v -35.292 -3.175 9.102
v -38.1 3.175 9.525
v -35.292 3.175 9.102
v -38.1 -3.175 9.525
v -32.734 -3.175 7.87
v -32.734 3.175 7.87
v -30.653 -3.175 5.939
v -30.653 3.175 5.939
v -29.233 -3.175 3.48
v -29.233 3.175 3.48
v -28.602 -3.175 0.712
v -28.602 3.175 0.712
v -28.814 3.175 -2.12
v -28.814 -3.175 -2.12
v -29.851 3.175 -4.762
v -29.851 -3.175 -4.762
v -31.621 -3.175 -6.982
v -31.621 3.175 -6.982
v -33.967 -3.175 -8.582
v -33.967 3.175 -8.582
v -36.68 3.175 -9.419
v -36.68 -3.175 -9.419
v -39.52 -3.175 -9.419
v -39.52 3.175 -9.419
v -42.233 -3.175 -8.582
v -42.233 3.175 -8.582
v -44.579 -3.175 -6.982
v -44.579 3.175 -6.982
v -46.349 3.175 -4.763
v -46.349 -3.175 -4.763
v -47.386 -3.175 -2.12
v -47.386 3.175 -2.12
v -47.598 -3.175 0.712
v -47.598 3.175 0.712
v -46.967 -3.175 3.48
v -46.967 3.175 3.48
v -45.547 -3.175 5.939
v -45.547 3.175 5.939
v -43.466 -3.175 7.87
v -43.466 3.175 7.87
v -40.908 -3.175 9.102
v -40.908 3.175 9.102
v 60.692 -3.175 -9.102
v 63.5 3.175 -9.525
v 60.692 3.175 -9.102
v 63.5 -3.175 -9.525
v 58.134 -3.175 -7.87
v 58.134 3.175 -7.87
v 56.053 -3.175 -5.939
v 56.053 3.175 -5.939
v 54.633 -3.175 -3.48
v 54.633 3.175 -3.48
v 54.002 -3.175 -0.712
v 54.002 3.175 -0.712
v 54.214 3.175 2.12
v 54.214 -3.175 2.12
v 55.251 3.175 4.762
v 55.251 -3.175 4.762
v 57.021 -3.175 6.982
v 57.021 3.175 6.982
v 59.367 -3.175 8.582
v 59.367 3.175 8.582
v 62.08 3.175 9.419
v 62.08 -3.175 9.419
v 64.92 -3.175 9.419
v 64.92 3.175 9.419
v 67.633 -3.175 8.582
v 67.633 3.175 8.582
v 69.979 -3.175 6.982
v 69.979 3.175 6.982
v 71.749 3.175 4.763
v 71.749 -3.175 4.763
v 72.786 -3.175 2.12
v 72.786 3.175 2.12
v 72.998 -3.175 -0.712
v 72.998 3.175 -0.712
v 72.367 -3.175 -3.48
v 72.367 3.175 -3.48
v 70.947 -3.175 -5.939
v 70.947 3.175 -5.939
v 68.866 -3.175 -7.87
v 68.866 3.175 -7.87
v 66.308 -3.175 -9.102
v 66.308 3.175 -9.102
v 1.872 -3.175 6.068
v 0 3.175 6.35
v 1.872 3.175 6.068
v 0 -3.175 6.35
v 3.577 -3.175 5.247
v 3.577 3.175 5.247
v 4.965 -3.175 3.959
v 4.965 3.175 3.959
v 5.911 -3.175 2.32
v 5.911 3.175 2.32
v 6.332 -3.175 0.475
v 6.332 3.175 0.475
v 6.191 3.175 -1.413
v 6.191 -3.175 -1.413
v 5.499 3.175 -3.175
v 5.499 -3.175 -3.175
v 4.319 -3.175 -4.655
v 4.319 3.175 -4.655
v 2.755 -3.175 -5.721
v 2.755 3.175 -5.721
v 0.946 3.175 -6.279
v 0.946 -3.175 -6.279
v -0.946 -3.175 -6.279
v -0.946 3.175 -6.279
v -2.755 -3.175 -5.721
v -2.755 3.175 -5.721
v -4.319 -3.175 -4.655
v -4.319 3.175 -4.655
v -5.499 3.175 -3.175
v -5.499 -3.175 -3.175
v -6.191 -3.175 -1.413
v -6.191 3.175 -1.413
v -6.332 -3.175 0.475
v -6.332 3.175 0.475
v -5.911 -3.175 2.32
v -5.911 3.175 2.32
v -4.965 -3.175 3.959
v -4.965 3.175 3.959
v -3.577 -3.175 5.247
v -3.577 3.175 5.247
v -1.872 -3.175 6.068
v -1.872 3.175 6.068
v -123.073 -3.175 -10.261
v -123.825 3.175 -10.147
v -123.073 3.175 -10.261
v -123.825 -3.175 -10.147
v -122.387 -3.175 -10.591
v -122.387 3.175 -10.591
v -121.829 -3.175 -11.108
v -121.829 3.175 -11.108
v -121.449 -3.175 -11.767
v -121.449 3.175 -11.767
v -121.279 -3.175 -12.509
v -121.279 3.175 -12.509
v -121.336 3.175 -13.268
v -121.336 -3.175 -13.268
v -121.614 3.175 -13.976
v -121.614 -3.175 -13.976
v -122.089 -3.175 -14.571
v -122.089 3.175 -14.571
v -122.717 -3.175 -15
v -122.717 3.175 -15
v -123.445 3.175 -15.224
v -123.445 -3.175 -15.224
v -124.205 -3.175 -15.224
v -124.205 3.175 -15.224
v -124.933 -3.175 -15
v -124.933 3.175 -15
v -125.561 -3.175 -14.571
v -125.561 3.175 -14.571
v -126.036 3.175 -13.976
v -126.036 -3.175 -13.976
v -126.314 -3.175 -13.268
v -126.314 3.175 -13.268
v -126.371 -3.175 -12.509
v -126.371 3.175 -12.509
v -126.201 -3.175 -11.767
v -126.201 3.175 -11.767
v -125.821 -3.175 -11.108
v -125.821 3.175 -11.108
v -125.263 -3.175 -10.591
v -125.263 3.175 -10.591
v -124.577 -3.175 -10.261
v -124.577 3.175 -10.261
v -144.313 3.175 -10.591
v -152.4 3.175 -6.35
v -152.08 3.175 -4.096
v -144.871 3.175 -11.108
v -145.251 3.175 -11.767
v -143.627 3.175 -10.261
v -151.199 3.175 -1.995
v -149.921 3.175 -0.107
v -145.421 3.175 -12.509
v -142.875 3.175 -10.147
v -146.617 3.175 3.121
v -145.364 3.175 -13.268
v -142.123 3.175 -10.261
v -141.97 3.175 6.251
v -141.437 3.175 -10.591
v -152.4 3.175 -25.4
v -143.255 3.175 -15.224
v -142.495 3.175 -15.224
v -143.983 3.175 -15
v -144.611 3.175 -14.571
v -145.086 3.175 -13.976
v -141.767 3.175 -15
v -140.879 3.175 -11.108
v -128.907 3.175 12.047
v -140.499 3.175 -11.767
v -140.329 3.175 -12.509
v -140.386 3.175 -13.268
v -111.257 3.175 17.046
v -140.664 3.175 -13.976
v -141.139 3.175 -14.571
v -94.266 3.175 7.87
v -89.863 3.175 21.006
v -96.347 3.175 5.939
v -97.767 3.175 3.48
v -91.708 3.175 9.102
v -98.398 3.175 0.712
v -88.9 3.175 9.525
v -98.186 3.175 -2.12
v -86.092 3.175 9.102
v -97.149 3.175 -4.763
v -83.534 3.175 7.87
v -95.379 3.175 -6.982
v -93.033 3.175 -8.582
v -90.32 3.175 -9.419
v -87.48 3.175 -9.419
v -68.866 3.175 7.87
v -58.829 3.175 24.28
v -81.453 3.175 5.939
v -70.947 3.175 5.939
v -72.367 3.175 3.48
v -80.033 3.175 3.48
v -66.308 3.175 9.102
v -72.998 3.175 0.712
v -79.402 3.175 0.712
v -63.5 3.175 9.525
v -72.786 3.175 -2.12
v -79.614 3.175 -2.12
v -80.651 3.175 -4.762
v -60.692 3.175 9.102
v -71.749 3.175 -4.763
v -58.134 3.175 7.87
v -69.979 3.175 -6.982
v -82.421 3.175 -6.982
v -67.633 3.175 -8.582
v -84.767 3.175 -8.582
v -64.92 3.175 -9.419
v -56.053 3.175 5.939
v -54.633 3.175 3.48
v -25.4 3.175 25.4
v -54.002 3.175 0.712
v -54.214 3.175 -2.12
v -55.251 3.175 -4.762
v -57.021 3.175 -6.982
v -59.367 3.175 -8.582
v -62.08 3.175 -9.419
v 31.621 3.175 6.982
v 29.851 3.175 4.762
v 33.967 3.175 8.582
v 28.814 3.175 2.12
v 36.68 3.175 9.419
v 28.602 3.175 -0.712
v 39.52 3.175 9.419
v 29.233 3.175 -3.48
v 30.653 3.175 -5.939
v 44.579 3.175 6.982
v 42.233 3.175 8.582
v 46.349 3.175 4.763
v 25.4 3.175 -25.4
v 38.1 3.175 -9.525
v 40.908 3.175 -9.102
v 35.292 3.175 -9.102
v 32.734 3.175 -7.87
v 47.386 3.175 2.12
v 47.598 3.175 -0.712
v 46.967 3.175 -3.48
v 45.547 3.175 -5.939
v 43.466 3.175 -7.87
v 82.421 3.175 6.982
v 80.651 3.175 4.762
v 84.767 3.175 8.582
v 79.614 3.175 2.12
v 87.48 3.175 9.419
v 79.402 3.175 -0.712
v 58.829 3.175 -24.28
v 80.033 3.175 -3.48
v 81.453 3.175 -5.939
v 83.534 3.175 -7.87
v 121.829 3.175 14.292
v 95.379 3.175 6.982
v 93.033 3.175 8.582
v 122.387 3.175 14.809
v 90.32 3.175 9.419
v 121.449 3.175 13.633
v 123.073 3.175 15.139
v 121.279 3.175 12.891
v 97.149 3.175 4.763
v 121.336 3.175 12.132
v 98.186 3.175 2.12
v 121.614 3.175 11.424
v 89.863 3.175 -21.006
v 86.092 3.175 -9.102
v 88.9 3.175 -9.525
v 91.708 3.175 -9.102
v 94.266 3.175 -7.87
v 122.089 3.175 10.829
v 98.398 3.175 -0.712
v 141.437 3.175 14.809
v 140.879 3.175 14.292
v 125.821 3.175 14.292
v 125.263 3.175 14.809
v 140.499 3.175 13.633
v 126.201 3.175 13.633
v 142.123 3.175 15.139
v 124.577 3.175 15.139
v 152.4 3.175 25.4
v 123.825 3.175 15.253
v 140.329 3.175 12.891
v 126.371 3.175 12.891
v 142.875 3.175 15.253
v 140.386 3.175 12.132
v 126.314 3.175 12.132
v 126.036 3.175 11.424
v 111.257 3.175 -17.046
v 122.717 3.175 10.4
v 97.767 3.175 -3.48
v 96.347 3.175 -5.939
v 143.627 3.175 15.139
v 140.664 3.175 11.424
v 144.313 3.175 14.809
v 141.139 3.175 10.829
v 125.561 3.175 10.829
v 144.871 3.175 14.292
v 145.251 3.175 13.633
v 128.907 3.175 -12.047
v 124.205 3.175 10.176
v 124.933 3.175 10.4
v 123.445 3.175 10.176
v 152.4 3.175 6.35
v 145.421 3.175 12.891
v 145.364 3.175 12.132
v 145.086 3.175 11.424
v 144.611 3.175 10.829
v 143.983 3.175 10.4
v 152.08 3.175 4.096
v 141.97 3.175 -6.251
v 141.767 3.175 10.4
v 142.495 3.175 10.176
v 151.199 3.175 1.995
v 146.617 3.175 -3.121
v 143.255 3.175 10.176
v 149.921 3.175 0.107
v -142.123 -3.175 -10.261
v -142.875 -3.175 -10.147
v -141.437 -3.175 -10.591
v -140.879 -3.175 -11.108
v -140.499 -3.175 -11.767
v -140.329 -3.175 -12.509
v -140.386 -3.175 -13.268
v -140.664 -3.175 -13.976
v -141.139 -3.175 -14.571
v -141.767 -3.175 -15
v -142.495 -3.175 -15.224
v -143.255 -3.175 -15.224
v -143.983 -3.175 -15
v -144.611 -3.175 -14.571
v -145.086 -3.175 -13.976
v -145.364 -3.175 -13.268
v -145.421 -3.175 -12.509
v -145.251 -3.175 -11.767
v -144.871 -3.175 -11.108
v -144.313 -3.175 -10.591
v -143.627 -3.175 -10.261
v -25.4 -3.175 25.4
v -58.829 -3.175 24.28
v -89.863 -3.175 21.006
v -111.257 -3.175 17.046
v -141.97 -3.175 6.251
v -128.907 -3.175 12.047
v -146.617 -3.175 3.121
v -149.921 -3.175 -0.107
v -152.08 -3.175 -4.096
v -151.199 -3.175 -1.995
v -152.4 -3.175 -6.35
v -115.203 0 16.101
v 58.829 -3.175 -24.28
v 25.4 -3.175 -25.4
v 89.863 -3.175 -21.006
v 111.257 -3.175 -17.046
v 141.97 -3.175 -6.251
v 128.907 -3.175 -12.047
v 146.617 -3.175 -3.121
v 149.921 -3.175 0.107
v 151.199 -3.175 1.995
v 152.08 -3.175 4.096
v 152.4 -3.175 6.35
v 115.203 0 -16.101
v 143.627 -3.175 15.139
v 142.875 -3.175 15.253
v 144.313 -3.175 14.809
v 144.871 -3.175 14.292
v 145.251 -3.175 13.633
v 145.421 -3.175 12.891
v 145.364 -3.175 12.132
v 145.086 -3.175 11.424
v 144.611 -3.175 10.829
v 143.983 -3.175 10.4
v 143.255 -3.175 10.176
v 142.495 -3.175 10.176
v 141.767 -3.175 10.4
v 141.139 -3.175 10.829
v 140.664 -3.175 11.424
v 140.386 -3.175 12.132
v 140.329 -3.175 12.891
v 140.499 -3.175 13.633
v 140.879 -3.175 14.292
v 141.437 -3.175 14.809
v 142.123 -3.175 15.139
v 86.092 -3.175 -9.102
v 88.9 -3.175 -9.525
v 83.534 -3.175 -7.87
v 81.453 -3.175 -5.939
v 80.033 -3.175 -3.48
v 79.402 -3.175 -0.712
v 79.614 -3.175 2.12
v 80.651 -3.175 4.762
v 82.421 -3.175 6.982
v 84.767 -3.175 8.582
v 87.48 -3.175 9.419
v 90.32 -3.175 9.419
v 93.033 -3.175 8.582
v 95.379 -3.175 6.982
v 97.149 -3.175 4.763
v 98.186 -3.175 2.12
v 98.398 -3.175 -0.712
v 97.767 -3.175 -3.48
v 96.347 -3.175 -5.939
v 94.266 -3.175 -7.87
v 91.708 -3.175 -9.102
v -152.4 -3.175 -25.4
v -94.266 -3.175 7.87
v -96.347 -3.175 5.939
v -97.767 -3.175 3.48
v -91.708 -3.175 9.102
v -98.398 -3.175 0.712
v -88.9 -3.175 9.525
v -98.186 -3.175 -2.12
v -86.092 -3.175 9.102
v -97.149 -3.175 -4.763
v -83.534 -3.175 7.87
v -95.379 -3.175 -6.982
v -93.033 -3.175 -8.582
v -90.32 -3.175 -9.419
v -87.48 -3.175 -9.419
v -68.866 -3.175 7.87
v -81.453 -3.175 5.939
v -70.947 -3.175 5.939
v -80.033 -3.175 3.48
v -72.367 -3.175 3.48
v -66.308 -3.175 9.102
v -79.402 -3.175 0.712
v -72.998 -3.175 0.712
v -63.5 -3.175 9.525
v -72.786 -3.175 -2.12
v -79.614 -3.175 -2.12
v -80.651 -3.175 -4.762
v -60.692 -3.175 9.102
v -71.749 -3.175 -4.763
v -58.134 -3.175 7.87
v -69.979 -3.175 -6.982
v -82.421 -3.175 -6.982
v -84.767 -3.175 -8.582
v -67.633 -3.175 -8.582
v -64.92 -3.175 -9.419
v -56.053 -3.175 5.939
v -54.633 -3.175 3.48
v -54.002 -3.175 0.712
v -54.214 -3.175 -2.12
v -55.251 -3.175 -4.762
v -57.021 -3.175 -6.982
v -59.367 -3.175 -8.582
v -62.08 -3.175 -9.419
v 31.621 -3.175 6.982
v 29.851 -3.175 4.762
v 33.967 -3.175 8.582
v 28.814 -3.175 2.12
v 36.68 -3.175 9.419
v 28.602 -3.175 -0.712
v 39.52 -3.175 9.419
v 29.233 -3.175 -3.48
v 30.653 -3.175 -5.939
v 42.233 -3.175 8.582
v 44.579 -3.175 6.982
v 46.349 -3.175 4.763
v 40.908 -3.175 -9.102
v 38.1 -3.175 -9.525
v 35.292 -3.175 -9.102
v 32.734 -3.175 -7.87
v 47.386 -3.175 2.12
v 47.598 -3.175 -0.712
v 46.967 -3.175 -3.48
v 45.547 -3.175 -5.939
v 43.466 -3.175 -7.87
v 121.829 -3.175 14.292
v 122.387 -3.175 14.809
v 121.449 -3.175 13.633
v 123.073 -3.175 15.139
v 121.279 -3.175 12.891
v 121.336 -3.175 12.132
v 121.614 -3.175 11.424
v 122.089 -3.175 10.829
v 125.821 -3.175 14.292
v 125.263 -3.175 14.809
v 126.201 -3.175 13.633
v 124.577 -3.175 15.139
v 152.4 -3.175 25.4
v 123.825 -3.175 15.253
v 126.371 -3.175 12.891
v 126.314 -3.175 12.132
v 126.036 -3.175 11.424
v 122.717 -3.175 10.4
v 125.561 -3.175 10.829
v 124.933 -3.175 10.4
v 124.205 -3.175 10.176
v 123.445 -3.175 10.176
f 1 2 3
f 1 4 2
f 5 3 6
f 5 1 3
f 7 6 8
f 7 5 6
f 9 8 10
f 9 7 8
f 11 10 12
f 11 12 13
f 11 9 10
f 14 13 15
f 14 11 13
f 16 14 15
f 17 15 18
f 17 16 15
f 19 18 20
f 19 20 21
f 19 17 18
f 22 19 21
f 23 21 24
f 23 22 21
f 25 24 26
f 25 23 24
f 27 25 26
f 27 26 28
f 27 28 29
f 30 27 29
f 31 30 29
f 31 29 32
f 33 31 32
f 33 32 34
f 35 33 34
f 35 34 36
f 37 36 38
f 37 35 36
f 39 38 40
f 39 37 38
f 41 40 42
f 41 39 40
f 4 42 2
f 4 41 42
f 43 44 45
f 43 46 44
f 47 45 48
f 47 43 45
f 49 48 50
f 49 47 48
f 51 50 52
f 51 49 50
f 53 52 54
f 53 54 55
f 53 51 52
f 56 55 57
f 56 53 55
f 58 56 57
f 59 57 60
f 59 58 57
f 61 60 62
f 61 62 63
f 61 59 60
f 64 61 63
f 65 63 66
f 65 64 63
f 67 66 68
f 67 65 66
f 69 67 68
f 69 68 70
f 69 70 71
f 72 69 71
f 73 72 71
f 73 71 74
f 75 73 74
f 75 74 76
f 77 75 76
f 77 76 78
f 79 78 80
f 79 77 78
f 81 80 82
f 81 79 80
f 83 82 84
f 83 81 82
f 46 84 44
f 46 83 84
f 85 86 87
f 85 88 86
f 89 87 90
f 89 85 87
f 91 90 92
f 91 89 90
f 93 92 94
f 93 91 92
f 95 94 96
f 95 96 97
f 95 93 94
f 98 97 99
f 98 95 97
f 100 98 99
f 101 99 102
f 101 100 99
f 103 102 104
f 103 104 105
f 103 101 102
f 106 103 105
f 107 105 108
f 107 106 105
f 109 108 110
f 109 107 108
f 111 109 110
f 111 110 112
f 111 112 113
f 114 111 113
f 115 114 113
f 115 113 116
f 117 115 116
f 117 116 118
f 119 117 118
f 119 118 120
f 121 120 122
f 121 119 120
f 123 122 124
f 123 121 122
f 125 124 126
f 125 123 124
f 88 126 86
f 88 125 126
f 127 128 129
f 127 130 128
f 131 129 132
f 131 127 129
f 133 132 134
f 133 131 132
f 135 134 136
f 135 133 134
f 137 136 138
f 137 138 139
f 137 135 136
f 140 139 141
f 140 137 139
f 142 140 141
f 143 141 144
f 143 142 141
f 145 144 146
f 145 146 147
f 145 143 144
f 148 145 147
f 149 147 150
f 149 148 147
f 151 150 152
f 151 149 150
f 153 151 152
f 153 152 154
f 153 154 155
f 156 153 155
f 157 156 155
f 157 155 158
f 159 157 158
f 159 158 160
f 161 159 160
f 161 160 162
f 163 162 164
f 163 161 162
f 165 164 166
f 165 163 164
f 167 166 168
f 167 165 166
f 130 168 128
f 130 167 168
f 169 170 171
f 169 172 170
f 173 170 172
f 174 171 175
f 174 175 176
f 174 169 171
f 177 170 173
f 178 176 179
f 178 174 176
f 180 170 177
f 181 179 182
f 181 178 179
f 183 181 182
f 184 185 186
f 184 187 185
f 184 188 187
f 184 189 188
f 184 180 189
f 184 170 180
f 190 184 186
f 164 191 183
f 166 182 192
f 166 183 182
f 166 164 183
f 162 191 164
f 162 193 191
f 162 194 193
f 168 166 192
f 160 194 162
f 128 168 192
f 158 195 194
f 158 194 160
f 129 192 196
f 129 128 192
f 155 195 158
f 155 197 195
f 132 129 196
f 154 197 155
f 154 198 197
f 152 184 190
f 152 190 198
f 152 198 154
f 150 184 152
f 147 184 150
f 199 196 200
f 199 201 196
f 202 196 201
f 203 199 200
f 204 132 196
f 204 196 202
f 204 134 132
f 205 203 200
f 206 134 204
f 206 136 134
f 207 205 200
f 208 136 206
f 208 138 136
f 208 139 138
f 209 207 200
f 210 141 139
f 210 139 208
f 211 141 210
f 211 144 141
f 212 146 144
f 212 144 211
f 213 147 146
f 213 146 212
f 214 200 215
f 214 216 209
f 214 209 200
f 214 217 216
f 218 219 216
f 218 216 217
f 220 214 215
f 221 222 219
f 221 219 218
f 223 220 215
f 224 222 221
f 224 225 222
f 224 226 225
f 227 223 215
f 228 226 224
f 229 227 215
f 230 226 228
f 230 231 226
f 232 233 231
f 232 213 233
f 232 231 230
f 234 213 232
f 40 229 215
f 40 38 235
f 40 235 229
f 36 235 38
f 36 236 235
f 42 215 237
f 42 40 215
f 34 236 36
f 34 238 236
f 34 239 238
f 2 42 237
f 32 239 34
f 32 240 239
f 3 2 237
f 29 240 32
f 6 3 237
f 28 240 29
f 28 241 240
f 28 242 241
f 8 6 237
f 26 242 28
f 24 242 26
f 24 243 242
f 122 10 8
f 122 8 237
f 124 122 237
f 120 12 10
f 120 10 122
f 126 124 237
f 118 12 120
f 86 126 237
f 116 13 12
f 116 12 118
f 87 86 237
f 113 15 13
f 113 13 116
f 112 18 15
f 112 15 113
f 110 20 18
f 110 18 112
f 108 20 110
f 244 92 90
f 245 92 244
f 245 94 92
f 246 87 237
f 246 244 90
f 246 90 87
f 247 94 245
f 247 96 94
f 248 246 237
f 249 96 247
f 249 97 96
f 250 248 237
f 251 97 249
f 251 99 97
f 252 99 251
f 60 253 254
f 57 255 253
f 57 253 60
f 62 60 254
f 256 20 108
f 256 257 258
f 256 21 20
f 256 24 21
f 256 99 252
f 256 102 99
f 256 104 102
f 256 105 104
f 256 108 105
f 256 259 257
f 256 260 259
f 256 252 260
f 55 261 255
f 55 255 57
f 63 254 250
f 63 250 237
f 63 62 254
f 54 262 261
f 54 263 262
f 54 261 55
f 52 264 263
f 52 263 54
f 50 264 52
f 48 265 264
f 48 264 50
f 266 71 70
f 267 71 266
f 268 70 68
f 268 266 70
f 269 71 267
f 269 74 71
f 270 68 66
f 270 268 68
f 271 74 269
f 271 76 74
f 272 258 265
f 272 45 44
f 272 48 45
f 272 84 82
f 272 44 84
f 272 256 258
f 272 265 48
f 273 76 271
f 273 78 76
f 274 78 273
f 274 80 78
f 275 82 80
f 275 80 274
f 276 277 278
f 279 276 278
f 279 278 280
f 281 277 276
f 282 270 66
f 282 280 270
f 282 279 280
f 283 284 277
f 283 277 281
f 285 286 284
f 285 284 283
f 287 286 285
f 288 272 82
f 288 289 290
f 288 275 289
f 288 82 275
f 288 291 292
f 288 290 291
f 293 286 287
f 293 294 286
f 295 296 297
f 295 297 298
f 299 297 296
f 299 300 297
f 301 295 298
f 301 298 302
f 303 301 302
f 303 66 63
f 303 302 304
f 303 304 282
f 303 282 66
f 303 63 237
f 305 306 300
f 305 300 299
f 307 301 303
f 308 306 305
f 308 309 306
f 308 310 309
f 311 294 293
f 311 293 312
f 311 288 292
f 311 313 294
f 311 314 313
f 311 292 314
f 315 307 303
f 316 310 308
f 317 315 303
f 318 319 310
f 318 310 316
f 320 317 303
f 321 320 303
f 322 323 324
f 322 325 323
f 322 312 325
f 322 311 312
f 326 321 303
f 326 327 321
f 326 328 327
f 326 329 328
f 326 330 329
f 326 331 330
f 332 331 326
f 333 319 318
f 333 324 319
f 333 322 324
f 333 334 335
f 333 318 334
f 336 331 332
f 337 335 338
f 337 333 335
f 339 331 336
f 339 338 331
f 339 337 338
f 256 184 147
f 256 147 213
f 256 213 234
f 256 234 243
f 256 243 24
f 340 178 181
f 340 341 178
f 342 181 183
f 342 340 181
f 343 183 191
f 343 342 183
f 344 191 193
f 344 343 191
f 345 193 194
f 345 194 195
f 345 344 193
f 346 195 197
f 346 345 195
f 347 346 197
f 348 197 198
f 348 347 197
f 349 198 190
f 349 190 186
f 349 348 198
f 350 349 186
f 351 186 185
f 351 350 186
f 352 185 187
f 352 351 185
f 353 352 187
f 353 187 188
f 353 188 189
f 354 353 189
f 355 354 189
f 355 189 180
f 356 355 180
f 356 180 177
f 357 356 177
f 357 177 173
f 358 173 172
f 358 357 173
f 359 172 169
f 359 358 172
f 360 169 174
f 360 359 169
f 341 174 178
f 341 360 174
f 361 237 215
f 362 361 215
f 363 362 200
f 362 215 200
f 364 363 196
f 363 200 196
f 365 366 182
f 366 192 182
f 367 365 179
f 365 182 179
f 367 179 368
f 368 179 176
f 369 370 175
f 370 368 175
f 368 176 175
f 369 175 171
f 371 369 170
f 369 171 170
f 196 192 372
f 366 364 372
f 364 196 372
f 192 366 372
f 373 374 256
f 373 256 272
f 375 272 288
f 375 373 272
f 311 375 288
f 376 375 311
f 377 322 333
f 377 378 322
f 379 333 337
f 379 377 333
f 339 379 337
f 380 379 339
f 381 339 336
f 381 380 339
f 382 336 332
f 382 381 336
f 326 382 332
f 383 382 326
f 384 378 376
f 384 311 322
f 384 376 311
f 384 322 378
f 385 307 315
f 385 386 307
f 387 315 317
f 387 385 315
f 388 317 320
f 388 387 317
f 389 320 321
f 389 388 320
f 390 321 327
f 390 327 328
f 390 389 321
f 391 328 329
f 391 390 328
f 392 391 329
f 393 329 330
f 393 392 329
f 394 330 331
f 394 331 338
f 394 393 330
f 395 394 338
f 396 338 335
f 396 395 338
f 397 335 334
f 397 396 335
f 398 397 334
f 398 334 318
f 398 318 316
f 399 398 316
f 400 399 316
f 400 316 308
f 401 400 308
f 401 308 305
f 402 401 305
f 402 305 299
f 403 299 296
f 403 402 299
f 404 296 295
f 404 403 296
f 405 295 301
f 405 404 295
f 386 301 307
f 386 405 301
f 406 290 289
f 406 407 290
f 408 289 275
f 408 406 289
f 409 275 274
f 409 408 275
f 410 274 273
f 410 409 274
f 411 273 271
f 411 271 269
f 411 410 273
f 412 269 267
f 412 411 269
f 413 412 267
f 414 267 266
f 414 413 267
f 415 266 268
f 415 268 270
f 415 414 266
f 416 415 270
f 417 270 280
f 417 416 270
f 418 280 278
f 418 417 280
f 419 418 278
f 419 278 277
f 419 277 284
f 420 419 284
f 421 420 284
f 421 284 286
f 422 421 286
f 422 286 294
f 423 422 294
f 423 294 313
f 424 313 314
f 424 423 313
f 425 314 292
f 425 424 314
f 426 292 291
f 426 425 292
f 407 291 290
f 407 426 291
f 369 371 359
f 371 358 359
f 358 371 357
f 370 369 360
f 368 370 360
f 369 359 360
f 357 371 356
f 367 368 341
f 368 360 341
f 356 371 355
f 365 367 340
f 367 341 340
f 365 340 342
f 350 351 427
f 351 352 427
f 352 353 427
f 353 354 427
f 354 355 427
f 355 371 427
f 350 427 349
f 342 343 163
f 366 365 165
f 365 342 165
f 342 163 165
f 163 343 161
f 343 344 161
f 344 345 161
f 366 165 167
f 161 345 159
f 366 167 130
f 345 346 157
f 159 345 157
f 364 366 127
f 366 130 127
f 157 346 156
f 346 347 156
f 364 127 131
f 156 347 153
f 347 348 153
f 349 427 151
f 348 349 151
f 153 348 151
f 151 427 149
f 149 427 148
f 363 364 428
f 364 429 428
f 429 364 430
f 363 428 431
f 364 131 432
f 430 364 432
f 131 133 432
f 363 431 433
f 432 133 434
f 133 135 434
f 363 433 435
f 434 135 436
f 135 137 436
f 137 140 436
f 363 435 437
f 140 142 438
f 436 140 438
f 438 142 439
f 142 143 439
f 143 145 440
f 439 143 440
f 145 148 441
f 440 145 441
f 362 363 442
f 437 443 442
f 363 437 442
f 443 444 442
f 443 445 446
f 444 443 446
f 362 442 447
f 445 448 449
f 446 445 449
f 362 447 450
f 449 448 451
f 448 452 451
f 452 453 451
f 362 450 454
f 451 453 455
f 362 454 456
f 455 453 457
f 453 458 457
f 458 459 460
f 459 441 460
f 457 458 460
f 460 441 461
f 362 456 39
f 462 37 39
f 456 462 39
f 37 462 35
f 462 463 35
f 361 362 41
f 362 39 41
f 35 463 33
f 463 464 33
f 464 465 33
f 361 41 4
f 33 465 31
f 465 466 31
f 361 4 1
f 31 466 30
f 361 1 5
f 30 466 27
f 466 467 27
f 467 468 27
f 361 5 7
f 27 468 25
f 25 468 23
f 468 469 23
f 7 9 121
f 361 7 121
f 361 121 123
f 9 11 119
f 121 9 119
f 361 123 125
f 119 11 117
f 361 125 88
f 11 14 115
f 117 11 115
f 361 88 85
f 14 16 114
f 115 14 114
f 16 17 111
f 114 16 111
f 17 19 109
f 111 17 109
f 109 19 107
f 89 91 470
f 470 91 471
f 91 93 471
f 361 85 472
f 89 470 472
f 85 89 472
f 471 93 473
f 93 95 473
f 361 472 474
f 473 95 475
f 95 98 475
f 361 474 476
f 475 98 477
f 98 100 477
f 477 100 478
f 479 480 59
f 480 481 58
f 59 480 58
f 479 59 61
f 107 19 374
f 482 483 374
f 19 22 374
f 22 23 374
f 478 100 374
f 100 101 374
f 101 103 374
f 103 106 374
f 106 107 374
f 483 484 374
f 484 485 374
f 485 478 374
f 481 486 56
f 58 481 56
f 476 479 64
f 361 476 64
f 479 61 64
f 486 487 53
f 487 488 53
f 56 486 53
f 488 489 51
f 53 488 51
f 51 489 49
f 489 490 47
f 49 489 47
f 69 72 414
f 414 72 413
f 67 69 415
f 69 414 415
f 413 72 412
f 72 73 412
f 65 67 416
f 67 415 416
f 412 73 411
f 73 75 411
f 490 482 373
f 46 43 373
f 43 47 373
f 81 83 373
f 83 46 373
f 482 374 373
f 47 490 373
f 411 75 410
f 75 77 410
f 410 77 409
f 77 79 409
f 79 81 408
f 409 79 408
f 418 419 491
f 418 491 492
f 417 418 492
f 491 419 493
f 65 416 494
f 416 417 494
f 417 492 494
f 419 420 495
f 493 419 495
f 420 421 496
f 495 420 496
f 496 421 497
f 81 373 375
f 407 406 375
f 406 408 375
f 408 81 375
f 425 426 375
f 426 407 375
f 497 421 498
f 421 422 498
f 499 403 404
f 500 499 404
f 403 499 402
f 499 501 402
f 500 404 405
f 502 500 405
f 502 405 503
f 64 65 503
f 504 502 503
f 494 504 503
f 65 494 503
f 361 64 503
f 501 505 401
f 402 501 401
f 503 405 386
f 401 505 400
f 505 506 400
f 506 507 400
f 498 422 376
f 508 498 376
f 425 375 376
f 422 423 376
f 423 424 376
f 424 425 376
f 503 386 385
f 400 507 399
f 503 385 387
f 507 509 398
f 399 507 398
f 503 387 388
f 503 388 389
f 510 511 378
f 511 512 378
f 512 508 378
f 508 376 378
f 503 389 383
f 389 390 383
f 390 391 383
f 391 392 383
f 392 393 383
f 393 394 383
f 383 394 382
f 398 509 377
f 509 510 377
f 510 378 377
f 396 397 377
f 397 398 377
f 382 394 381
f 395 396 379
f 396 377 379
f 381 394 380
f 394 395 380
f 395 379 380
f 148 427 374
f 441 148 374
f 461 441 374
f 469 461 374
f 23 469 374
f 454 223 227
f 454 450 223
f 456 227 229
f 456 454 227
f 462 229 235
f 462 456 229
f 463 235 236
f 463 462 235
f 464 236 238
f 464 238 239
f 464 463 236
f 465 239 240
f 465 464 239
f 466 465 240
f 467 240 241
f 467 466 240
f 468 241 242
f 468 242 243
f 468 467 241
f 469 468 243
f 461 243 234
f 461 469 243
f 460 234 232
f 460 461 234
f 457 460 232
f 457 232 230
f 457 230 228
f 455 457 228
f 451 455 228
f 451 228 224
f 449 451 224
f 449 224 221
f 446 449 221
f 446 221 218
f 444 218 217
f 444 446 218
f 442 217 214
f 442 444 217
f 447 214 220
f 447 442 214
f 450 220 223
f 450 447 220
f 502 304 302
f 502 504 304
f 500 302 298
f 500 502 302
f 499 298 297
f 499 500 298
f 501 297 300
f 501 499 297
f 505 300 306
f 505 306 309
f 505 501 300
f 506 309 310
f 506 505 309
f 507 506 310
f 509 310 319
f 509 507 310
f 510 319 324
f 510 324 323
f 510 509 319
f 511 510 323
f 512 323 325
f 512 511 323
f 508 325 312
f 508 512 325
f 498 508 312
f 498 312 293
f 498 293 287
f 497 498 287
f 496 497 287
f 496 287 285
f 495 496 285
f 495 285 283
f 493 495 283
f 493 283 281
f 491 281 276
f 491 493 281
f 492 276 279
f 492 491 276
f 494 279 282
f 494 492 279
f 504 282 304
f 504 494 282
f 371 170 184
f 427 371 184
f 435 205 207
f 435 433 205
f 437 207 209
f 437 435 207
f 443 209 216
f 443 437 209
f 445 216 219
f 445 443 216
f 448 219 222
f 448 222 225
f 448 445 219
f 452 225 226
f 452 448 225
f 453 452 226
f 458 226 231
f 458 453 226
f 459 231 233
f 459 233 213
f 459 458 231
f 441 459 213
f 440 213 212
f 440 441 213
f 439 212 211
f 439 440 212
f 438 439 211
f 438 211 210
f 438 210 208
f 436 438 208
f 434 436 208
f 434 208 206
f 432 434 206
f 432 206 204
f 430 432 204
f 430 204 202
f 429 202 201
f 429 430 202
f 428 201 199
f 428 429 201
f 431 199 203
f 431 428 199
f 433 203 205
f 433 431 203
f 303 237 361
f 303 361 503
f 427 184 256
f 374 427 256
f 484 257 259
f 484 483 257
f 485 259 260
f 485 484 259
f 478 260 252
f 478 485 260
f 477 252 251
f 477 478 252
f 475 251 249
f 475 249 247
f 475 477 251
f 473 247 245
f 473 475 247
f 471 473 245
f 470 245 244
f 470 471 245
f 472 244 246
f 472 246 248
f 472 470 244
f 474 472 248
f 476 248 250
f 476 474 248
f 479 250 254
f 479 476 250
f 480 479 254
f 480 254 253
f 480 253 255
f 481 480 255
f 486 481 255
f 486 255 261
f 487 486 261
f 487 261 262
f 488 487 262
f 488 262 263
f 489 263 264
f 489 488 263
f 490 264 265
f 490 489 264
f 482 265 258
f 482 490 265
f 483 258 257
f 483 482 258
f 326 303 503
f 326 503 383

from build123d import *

# Parameters (mm, degrees)
SKETCH2_W           = 304.8
SKETCH2_H           = 50.8
SKETCH2_R           = 6.35
SKETCH2_R_2         = 9.525
SKETCH2_R_3         = 2.5527
BOSS_EXTRUDE2_DEPTH = 3.175
FILLET1_SIZE        = 127
FILLET1_SIZE_2      = 31.75


with BuildPart() as part:
    # Sketch2 → Boss-Extrude2 (new, symmetric)
    with BuildSketch(Plane(origin=(0, 0, 0), x_dir=(1, 0, 0), z_dir=(0, 1, 0))):
        Rectangle(SKETCH2_W, SKETCH2_H)
        with Locations(Location((0, 0, 0), (0, 0, 270))):
            Circle(SKETCH2_R, mode=Mode.SUBTRACT)
        with Locations(Location((-38.1, 0, 0), (0, 0, 270))):
            Circle(SKETCH2_R_2, mode=Mode.SUBTRACT)
        with Locations(Location((-63.5, 0, 0), (0, 0, 270))):
            Circle(SKETCH2_R_2, mode=Mode.SUBTRACT)
        with Locations(Location((-88.9, 0, 0), (0, 0, 270))):
            Circle(SKETCH2_R_2, mode=Mode.SUBTRACT)
        with Locations(Location((38.1, 0, 0), (0, 0, 90))):
            Circle(SKETCH2_R_2, mode=Mode.SUBTRACT)
        with Locations(Location((63.5, 0, 0), (0, 0, 90))):
            Circle(SKETCH2_R_2, mode=Mode.SUBTRACT)
        with Locations(Location((88.9, 0, 0), (0, 0, 90))):
            Circle(SKETCH2_R_2, mode=Mode.SUBTRACT)
        with Locations(Location((142.875, -12.7, 0), (0, 0, 270))):
            Circle(SKETCH2_R_3, mode=Mode.SUBTRACT)
        with Locations(Location((123.825, -12.7, 0), (0, 0, 270))):
            Circle(SKETCH2_R_3, mode=Mode.SUBTRACT)
        with Locations(Location((-142.875, 12.7, 0), (0, 0, 270))):
            Circle(SKETCH2_R_3, mode=Mode.SUBTRACT)
        with Locations(Location((-123.825, 12.7, 0), (0, 0, 270))):
            Circle(SKETCH2_R_3, mode=Mode.SUBTRACT)
    extrude(amount=BOSS_EXTRUDE2_DEPTH, both=True)

    # Fillet1
    # an asymmetric fillet: 127, 31.75 mm, written as the material it takes off along each edge
    with BuildSketch(Plane(origin=(152.4, -320.675, -25.4), x_dir=(-1, 0, 0), z_dir=(0, 1, 0))) as fillet1_piece_1:
        with BuildLine():
            Bezier((FILLET1_SIZE, 0), (0, 0), (0, FILLET1_SIZE_2), weights=[1, 0.707106781, 1])
            Line((0, FILLET1_SIZE_2), (0, 0))
            Line((0, 0), (FILLET1_SIZE, 0))
        make_face()
    extrude(amount=641.35, mode=Mode.SUBTRACT)
    with BuildSketch(Plane(origin=(-152.4, 320.675, 25.4), x_dir=(1, 0, 0), z_dir=(0, -1, 0))) as fillet1_piece_2:
        with BuildLine():
            Bezier((FILLET1_SIZE, 0), (0, 0), (0, -FILLET1_SIZE_2), weights=[1, 0.707106781, 1])
            Line((0, -FILLET1_SIZE_2), (0, 0))
            Line((0, 0), (FILLET1_SIZE, 0))
        make_face()
    extrude(amount=641.35, mode=Mode.SUBTRACT)


solid = part.part
